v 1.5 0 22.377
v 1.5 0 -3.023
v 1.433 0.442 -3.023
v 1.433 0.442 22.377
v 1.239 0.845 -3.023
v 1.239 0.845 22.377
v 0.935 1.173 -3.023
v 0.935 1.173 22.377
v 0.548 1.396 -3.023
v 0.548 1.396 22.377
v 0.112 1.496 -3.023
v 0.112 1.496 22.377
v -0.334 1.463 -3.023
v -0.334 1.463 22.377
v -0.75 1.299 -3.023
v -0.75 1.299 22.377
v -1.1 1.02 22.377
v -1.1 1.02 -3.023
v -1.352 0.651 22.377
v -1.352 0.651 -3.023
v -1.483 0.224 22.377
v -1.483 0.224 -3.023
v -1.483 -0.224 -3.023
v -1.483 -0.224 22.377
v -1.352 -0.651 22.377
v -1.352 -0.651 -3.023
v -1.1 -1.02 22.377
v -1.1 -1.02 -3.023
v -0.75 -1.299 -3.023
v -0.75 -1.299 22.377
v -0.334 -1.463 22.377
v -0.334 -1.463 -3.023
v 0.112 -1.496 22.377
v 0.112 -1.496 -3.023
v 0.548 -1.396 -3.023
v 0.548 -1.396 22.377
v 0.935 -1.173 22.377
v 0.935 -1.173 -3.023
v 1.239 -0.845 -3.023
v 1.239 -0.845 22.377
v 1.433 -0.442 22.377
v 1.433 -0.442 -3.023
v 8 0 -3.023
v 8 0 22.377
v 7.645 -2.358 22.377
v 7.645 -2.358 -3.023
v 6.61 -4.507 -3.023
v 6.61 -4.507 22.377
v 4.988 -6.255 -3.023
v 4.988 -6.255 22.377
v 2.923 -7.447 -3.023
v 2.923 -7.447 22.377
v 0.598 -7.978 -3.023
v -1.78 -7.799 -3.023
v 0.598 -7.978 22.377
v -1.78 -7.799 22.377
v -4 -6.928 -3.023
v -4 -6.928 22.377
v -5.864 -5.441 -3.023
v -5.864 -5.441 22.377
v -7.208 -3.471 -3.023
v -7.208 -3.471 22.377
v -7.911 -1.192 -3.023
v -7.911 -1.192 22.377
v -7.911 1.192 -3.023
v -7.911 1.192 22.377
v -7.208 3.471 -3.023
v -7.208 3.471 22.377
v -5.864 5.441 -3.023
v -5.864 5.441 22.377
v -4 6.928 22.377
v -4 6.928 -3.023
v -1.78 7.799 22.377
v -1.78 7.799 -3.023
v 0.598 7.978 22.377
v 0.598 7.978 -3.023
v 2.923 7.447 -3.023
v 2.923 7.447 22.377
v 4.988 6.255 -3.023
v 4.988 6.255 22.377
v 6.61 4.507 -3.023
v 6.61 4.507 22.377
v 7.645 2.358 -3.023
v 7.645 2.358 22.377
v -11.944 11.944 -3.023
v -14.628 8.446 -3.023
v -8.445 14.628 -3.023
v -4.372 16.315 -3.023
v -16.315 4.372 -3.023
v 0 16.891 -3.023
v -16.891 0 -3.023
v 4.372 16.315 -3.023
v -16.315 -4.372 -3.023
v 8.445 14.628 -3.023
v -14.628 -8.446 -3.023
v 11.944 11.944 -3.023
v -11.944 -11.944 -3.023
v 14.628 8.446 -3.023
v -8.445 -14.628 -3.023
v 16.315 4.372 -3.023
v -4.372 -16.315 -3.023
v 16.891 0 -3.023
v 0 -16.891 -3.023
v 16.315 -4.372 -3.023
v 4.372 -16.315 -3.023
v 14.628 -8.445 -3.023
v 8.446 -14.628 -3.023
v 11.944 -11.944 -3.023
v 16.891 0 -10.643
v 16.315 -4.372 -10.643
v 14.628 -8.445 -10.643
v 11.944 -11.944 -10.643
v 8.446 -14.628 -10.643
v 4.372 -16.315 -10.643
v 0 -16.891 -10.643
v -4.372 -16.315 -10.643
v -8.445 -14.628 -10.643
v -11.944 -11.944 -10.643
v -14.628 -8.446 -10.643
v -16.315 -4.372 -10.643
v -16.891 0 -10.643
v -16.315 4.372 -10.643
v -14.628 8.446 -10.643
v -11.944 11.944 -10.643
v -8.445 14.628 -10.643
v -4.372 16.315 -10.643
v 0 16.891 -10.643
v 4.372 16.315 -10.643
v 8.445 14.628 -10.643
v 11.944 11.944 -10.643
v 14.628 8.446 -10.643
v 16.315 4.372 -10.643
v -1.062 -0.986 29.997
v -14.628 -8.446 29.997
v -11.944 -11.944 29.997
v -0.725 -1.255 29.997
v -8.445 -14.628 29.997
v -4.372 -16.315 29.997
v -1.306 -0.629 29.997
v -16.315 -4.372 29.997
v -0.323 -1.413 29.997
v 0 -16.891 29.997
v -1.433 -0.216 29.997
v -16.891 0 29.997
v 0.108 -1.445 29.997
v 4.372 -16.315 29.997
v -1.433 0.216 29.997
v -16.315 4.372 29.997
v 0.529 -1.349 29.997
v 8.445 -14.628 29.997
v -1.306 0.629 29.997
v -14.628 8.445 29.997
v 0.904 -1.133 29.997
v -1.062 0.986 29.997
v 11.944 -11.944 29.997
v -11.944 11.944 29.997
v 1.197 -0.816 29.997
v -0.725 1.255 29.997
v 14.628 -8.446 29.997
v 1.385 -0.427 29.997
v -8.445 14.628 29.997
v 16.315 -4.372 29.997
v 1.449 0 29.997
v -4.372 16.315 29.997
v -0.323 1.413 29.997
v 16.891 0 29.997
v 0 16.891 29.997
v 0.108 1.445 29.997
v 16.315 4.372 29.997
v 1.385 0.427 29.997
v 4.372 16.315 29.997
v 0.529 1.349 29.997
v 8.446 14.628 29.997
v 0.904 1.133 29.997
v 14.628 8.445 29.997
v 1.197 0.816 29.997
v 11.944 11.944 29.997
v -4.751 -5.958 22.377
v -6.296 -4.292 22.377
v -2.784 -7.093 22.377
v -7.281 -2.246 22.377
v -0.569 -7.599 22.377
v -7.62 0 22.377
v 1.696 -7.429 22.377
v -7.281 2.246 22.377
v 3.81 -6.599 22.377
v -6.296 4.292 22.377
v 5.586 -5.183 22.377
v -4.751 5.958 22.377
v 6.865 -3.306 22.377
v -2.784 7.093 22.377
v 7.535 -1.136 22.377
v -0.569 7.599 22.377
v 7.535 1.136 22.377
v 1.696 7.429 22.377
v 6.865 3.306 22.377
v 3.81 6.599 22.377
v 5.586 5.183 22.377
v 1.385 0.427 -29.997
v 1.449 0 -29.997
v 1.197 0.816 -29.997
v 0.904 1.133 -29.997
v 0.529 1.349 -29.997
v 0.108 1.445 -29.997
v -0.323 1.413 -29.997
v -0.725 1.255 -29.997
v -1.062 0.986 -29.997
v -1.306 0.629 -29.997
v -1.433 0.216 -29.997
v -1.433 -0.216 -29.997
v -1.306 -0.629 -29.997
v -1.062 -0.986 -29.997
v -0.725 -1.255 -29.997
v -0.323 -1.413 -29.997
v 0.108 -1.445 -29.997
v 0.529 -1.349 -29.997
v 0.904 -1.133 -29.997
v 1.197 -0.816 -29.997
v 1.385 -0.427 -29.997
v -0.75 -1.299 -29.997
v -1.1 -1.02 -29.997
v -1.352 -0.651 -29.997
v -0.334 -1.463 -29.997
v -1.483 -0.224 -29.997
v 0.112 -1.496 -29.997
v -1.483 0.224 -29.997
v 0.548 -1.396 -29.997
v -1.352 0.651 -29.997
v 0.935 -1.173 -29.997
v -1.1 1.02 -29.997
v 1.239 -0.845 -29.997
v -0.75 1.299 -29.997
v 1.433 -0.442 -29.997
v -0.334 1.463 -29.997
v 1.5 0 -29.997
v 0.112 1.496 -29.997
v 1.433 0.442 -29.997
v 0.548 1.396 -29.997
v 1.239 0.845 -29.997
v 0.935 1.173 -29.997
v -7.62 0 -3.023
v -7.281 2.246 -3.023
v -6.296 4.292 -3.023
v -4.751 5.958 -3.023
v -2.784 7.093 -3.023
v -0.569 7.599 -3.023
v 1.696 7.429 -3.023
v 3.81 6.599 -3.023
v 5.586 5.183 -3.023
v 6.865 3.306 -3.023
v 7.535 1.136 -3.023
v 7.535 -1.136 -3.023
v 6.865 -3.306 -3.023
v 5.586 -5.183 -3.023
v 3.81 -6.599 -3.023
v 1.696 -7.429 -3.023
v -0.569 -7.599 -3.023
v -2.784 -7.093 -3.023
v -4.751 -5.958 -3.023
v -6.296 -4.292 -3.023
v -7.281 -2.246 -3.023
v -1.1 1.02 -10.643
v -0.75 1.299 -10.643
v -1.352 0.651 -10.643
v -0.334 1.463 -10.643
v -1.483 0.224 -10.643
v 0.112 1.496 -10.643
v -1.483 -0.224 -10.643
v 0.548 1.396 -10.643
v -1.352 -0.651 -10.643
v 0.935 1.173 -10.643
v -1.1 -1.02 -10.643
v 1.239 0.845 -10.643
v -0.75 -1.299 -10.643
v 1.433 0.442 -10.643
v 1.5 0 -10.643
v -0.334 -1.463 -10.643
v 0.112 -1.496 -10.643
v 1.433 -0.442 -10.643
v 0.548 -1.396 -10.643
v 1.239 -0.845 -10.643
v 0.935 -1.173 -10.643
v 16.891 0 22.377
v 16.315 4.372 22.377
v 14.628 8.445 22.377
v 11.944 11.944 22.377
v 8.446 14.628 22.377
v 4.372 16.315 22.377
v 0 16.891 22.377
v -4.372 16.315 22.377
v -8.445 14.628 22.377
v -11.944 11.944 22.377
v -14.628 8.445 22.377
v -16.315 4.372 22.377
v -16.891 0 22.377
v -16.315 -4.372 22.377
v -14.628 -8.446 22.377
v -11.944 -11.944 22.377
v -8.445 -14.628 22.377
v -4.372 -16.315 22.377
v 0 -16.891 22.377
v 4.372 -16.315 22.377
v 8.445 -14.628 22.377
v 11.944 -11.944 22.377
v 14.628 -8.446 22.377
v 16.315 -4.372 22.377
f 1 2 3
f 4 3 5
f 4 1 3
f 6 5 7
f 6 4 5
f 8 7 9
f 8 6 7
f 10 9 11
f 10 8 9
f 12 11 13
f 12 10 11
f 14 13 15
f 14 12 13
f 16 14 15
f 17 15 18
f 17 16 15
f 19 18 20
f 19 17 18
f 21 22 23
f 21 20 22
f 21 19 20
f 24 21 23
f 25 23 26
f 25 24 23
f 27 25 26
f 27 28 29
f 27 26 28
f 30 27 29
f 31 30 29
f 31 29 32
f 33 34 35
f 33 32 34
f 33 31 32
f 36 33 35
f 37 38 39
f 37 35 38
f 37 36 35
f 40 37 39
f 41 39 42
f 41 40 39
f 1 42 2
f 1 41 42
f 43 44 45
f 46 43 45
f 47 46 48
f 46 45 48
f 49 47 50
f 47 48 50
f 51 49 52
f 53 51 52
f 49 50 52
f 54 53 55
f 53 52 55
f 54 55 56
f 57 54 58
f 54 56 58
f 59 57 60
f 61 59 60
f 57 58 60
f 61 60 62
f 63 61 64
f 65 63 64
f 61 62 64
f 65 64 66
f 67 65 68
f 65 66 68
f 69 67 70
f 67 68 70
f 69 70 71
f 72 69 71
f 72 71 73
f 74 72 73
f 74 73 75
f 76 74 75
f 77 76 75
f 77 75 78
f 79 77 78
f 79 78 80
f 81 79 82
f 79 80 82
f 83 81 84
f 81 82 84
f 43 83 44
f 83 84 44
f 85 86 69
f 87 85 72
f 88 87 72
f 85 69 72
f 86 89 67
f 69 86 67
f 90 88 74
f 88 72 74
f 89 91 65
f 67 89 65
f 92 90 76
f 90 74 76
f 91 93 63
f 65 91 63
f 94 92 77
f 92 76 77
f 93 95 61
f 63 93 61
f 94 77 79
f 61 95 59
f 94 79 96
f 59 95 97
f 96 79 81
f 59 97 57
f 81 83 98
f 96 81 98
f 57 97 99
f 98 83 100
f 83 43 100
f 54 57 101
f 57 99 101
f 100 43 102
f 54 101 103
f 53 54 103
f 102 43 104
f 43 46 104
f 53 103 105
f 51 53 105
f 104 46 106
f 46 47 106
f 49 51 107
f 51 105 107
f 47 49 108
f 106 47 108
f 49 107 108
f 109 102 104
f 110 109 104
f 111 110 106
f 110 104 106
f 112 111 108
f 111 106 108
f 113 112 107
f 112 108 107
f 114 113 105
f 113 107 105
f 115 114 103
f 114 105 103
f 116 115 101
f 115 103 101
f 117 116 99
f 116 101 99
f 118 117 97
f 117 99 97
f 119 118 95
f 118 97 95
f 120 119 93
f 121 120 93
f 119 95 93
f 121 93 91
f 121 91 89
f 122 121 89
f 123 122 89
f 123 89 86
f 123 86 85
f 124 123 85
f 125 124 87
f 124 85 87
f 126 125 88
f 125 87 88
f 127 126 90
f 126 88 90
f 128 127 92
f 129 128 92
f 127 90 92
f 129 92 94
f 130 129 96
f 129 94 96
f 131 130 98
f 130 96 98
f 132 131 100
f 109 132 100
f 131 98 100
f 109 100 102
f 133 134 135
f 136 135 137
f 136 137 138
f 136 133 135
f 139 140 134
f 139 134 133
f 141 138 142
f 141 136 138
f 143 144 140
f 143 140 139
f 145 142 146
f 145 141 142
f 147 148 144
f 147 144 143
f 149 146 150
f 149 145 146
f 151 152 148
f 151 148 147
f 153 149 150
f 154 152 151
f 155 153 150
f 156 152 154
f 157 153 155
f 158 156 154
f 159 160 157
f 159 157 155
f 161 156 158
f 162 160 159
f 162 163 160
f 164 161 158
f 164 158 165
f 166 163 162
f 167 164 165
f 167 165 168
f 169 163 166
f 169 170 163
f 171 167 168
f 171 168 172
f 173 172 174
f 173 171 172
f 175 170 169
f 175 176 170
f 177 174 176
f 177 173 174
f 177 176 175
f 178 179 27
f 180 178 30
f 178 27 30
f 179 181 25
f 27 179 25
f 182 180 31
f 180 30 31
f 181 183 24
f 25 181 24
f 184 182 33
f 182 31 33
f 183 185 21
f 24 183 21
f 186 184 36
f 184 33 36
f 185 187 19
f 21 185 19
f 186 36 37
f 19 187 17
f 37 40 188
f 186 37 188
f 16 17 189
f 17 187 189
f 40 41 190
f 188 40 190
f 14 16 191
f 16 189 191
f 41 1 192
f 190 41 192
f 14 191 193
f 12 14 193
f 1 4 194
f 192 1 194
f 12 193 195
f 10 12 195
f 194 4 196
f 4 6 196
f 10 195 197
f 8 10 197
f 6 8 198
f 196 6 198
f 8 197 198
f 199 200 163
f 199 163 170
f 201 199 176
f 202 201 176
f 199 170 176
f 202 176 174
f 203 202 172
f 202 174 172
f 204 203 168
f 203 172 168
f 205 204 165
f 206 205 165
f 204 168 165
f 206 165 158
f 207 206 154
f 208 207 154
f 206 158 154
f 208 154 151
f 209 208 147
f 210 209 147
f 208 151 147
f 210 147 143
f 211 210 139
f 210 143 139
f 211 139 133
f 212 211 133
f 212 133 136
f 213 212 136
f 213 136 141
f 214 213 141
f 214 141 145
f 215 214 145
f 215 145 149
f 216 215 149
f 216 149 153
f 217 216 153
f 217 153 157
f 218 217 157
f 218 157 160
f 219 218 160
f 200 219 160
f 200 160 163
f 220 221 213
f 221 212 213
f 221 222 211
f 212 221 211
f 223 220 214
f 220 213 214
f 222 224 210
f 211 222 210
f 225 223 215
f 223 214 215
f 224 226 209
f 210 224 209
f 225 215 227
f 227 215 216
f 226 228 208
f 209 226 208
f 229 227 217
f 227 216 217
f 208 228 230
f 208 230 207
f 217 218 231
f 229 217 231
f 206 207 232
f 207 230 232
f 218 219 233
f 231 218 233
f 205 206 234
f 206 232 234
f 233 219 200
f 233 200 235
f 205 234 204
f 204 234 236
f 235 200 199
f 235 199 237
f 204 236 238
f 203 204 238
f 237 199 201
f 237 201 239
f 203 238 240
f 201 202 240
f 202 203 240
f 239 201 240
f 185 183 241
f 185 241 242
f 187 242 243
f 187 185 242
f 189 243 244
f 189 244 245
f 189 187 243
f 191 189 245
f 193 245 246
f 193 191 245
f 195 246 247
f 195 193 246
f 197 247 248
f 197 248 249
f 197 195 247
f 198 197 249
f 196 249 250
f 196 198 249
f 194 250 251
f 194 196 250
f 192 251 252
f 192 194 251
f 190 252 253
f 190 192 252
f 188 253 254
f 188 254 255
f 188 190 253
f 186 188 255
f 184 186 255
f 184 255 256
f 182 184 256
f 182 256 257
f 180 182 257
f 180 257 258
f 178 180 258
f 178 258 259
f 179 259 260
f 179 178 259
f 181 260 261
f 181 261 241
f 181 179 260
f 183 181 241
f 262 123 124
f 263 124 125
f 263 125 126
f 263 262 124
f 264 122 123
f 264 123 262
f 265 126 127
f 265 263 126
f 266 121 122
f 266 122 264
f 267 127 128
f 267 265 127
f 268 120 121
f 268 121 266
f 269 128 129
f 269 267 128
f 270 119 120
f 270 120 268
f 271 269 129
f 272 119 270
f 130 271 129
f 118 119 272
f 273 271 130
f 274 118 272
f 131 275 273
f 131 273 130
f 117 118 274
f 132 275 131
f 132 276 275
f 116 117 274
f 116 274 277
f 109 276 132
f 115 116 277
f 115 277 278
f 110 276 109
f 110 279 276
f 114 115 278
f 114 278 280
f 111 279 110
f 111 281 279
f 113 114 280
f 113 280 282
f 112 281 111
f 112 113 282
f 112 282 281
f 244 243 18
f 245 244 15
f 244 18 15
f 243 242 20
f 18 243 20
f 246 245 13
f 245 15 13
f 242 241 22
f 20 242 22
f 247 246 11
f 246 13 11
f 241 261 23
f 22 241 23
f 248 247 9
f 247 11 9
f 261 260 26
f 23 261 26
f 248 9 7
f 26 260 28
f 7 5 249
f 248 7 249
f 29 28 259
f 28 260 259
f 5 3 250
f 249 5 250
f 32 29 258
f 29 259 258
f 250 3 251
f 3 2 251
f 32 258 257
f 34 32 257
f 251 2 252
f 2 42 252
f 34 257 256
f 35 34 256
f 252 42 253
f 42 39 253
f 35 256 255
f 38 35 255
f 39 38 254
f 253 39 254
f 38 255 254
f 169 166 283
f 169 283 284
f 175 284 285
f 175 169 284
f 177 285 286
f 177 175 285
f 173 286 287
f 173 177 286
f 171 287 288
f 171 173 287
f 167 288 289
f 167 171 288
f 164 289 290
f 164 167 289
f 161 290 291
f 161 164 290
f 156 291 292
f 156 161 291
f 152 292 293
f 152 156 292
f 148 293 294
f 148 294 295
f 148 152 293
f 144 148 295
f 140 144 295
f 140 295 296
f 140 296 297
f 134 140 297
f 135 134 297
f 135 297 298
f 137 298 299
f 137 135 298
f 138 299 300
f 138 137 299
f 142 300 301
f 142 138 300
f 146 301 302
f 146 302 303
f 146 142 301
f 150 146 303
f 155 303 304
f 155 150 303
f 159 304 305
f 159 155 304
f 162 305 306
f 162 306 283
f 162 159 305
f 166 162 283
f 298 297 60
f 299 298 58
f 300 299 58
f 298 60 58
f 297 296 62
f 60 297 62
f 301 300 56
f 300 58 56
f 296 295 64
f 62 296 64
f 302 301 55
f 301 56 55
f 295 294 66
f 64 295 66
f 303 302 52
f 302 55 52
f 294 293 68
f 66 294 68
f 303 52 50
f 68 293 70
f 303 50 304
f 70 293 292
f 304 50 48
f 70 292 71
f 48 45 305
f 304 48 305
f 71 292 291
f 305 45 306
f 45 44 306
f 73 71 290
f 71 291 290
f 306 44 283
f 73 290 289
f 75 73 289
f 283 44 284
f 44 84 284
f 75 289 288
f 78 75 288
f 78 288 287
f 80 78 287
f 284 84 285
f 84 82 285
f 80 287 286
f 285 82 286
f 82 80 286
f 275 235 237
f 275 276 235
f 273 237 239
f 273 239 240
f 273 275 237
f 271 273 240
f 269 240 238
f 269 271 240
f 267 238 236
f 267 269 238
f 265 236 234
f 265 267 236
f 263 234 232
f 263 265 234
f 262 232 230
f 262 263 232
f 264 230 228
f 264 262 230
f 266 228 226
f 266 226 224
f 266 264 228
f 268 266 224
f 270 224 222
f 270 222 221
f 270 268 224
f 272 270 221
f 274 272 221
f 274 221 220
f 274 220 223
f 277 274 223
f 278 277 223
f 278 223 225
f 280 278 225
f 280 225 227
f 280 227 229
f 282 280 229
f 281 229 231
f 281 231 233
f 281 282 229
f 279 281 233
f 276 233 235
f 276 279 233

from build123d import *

# Parameters (mm, degrees)
SKETCH1_R            = 1.500124
BOSS_EXTRUDE1_DEPTH  = 29.9974
SHELL3_T             = -0.0508
SKETCH5_R            = 16.891
SKETCH5_R_2          = 1.449324
BOSS_EXTRUDE8_DEPTH  = 7.62
SKETCH6_R            = 7.9999967
SKETCH6_R_2          = 7.62
BOSS_EXTRUDE9_DEPTH  = 25.4
SKETCH7_R            = 16.891
SKETCH7_R_2          = 1.500124
BOSS_EXTRUDE10_DEPTH = 7.62
SKETCH8_R            = 7.9999967
SKETCH8_R_2          = 1.449324
BOSS_EXTRUDE11_DEPTH = 2.54


with BuildPart() as part:
    # Sketch1 → Boss-Extrude1 (new, symmetric)
    with BuildSketch(Plane.XY):
        Circle(SKETCH1_R)
    extrude(amount=BOSS_EXTRUDE1_DEPTH, both=True)

    # Shell3
    shell3_openings = [part.faces().sort_by_distance(p)[0] for p in [
        (0, 0, 29.9974),
        (0, 0, -29.9974),
    ]]
    offset(amount=SHELL3_T, openings=shell3_openings, kind=Kind.INTERSECTION)

    # Sketch5 → Boss-Extrude8 (add)
    with BuildSketch(Plane.XY.offset(29.9974)):
        Circle(SKETCH5_R)
        Circle(SKETCH5_R_2, mode=Mode.SUBTRACT)
    extrude(amount=-BOSS_EXTRUDE8_DEPTH)

    # Sketch6 → Boss-Extrude9 (add)
    with BuildSketch(Plane(origin=(0, 0, 22.3774), x_dir=(-1, 0, 0), z_dir=(0, 0, -1))):
        with Locations(Location((0, 0, 0), (0, 0, 180))):
            Circle(SKETCH6_R)
        Circle(SKETCH6_R_2, mode=Mode.SUBTRACT)
    extrude(amount=BOSS_EXTRUDE9_DEPTH)

    # Sketch7 → Boss-Extrude10 (add)
    with BuildSketch(Plane(origin=(0, 0, -3.0226), x_dir=(-1, 0, 0), z_dir=(0, 0, -1))):
        with Locations(Location((0, 0, 0), (0, 0, 180))):
            Circle(SKETCH7_R)
        Circle(SKETCH7_R_2, mode=Mode.SUBTRACT)
    extrude(amount=BOSS_EXTRUDE10_DEPTH)

    # Sketch8 → Boss-Extrude11 (add)
    with BuildSketch(Plane.XY.offset(29.9974)):
        Circle(SKETCH8_R)
        Circle(SKETCH8_R_2, mode=Mode.SUBTRACT)
    extrude(amount=-BOSS_EXTRUDE11_DEPTH)


solid = part.part
